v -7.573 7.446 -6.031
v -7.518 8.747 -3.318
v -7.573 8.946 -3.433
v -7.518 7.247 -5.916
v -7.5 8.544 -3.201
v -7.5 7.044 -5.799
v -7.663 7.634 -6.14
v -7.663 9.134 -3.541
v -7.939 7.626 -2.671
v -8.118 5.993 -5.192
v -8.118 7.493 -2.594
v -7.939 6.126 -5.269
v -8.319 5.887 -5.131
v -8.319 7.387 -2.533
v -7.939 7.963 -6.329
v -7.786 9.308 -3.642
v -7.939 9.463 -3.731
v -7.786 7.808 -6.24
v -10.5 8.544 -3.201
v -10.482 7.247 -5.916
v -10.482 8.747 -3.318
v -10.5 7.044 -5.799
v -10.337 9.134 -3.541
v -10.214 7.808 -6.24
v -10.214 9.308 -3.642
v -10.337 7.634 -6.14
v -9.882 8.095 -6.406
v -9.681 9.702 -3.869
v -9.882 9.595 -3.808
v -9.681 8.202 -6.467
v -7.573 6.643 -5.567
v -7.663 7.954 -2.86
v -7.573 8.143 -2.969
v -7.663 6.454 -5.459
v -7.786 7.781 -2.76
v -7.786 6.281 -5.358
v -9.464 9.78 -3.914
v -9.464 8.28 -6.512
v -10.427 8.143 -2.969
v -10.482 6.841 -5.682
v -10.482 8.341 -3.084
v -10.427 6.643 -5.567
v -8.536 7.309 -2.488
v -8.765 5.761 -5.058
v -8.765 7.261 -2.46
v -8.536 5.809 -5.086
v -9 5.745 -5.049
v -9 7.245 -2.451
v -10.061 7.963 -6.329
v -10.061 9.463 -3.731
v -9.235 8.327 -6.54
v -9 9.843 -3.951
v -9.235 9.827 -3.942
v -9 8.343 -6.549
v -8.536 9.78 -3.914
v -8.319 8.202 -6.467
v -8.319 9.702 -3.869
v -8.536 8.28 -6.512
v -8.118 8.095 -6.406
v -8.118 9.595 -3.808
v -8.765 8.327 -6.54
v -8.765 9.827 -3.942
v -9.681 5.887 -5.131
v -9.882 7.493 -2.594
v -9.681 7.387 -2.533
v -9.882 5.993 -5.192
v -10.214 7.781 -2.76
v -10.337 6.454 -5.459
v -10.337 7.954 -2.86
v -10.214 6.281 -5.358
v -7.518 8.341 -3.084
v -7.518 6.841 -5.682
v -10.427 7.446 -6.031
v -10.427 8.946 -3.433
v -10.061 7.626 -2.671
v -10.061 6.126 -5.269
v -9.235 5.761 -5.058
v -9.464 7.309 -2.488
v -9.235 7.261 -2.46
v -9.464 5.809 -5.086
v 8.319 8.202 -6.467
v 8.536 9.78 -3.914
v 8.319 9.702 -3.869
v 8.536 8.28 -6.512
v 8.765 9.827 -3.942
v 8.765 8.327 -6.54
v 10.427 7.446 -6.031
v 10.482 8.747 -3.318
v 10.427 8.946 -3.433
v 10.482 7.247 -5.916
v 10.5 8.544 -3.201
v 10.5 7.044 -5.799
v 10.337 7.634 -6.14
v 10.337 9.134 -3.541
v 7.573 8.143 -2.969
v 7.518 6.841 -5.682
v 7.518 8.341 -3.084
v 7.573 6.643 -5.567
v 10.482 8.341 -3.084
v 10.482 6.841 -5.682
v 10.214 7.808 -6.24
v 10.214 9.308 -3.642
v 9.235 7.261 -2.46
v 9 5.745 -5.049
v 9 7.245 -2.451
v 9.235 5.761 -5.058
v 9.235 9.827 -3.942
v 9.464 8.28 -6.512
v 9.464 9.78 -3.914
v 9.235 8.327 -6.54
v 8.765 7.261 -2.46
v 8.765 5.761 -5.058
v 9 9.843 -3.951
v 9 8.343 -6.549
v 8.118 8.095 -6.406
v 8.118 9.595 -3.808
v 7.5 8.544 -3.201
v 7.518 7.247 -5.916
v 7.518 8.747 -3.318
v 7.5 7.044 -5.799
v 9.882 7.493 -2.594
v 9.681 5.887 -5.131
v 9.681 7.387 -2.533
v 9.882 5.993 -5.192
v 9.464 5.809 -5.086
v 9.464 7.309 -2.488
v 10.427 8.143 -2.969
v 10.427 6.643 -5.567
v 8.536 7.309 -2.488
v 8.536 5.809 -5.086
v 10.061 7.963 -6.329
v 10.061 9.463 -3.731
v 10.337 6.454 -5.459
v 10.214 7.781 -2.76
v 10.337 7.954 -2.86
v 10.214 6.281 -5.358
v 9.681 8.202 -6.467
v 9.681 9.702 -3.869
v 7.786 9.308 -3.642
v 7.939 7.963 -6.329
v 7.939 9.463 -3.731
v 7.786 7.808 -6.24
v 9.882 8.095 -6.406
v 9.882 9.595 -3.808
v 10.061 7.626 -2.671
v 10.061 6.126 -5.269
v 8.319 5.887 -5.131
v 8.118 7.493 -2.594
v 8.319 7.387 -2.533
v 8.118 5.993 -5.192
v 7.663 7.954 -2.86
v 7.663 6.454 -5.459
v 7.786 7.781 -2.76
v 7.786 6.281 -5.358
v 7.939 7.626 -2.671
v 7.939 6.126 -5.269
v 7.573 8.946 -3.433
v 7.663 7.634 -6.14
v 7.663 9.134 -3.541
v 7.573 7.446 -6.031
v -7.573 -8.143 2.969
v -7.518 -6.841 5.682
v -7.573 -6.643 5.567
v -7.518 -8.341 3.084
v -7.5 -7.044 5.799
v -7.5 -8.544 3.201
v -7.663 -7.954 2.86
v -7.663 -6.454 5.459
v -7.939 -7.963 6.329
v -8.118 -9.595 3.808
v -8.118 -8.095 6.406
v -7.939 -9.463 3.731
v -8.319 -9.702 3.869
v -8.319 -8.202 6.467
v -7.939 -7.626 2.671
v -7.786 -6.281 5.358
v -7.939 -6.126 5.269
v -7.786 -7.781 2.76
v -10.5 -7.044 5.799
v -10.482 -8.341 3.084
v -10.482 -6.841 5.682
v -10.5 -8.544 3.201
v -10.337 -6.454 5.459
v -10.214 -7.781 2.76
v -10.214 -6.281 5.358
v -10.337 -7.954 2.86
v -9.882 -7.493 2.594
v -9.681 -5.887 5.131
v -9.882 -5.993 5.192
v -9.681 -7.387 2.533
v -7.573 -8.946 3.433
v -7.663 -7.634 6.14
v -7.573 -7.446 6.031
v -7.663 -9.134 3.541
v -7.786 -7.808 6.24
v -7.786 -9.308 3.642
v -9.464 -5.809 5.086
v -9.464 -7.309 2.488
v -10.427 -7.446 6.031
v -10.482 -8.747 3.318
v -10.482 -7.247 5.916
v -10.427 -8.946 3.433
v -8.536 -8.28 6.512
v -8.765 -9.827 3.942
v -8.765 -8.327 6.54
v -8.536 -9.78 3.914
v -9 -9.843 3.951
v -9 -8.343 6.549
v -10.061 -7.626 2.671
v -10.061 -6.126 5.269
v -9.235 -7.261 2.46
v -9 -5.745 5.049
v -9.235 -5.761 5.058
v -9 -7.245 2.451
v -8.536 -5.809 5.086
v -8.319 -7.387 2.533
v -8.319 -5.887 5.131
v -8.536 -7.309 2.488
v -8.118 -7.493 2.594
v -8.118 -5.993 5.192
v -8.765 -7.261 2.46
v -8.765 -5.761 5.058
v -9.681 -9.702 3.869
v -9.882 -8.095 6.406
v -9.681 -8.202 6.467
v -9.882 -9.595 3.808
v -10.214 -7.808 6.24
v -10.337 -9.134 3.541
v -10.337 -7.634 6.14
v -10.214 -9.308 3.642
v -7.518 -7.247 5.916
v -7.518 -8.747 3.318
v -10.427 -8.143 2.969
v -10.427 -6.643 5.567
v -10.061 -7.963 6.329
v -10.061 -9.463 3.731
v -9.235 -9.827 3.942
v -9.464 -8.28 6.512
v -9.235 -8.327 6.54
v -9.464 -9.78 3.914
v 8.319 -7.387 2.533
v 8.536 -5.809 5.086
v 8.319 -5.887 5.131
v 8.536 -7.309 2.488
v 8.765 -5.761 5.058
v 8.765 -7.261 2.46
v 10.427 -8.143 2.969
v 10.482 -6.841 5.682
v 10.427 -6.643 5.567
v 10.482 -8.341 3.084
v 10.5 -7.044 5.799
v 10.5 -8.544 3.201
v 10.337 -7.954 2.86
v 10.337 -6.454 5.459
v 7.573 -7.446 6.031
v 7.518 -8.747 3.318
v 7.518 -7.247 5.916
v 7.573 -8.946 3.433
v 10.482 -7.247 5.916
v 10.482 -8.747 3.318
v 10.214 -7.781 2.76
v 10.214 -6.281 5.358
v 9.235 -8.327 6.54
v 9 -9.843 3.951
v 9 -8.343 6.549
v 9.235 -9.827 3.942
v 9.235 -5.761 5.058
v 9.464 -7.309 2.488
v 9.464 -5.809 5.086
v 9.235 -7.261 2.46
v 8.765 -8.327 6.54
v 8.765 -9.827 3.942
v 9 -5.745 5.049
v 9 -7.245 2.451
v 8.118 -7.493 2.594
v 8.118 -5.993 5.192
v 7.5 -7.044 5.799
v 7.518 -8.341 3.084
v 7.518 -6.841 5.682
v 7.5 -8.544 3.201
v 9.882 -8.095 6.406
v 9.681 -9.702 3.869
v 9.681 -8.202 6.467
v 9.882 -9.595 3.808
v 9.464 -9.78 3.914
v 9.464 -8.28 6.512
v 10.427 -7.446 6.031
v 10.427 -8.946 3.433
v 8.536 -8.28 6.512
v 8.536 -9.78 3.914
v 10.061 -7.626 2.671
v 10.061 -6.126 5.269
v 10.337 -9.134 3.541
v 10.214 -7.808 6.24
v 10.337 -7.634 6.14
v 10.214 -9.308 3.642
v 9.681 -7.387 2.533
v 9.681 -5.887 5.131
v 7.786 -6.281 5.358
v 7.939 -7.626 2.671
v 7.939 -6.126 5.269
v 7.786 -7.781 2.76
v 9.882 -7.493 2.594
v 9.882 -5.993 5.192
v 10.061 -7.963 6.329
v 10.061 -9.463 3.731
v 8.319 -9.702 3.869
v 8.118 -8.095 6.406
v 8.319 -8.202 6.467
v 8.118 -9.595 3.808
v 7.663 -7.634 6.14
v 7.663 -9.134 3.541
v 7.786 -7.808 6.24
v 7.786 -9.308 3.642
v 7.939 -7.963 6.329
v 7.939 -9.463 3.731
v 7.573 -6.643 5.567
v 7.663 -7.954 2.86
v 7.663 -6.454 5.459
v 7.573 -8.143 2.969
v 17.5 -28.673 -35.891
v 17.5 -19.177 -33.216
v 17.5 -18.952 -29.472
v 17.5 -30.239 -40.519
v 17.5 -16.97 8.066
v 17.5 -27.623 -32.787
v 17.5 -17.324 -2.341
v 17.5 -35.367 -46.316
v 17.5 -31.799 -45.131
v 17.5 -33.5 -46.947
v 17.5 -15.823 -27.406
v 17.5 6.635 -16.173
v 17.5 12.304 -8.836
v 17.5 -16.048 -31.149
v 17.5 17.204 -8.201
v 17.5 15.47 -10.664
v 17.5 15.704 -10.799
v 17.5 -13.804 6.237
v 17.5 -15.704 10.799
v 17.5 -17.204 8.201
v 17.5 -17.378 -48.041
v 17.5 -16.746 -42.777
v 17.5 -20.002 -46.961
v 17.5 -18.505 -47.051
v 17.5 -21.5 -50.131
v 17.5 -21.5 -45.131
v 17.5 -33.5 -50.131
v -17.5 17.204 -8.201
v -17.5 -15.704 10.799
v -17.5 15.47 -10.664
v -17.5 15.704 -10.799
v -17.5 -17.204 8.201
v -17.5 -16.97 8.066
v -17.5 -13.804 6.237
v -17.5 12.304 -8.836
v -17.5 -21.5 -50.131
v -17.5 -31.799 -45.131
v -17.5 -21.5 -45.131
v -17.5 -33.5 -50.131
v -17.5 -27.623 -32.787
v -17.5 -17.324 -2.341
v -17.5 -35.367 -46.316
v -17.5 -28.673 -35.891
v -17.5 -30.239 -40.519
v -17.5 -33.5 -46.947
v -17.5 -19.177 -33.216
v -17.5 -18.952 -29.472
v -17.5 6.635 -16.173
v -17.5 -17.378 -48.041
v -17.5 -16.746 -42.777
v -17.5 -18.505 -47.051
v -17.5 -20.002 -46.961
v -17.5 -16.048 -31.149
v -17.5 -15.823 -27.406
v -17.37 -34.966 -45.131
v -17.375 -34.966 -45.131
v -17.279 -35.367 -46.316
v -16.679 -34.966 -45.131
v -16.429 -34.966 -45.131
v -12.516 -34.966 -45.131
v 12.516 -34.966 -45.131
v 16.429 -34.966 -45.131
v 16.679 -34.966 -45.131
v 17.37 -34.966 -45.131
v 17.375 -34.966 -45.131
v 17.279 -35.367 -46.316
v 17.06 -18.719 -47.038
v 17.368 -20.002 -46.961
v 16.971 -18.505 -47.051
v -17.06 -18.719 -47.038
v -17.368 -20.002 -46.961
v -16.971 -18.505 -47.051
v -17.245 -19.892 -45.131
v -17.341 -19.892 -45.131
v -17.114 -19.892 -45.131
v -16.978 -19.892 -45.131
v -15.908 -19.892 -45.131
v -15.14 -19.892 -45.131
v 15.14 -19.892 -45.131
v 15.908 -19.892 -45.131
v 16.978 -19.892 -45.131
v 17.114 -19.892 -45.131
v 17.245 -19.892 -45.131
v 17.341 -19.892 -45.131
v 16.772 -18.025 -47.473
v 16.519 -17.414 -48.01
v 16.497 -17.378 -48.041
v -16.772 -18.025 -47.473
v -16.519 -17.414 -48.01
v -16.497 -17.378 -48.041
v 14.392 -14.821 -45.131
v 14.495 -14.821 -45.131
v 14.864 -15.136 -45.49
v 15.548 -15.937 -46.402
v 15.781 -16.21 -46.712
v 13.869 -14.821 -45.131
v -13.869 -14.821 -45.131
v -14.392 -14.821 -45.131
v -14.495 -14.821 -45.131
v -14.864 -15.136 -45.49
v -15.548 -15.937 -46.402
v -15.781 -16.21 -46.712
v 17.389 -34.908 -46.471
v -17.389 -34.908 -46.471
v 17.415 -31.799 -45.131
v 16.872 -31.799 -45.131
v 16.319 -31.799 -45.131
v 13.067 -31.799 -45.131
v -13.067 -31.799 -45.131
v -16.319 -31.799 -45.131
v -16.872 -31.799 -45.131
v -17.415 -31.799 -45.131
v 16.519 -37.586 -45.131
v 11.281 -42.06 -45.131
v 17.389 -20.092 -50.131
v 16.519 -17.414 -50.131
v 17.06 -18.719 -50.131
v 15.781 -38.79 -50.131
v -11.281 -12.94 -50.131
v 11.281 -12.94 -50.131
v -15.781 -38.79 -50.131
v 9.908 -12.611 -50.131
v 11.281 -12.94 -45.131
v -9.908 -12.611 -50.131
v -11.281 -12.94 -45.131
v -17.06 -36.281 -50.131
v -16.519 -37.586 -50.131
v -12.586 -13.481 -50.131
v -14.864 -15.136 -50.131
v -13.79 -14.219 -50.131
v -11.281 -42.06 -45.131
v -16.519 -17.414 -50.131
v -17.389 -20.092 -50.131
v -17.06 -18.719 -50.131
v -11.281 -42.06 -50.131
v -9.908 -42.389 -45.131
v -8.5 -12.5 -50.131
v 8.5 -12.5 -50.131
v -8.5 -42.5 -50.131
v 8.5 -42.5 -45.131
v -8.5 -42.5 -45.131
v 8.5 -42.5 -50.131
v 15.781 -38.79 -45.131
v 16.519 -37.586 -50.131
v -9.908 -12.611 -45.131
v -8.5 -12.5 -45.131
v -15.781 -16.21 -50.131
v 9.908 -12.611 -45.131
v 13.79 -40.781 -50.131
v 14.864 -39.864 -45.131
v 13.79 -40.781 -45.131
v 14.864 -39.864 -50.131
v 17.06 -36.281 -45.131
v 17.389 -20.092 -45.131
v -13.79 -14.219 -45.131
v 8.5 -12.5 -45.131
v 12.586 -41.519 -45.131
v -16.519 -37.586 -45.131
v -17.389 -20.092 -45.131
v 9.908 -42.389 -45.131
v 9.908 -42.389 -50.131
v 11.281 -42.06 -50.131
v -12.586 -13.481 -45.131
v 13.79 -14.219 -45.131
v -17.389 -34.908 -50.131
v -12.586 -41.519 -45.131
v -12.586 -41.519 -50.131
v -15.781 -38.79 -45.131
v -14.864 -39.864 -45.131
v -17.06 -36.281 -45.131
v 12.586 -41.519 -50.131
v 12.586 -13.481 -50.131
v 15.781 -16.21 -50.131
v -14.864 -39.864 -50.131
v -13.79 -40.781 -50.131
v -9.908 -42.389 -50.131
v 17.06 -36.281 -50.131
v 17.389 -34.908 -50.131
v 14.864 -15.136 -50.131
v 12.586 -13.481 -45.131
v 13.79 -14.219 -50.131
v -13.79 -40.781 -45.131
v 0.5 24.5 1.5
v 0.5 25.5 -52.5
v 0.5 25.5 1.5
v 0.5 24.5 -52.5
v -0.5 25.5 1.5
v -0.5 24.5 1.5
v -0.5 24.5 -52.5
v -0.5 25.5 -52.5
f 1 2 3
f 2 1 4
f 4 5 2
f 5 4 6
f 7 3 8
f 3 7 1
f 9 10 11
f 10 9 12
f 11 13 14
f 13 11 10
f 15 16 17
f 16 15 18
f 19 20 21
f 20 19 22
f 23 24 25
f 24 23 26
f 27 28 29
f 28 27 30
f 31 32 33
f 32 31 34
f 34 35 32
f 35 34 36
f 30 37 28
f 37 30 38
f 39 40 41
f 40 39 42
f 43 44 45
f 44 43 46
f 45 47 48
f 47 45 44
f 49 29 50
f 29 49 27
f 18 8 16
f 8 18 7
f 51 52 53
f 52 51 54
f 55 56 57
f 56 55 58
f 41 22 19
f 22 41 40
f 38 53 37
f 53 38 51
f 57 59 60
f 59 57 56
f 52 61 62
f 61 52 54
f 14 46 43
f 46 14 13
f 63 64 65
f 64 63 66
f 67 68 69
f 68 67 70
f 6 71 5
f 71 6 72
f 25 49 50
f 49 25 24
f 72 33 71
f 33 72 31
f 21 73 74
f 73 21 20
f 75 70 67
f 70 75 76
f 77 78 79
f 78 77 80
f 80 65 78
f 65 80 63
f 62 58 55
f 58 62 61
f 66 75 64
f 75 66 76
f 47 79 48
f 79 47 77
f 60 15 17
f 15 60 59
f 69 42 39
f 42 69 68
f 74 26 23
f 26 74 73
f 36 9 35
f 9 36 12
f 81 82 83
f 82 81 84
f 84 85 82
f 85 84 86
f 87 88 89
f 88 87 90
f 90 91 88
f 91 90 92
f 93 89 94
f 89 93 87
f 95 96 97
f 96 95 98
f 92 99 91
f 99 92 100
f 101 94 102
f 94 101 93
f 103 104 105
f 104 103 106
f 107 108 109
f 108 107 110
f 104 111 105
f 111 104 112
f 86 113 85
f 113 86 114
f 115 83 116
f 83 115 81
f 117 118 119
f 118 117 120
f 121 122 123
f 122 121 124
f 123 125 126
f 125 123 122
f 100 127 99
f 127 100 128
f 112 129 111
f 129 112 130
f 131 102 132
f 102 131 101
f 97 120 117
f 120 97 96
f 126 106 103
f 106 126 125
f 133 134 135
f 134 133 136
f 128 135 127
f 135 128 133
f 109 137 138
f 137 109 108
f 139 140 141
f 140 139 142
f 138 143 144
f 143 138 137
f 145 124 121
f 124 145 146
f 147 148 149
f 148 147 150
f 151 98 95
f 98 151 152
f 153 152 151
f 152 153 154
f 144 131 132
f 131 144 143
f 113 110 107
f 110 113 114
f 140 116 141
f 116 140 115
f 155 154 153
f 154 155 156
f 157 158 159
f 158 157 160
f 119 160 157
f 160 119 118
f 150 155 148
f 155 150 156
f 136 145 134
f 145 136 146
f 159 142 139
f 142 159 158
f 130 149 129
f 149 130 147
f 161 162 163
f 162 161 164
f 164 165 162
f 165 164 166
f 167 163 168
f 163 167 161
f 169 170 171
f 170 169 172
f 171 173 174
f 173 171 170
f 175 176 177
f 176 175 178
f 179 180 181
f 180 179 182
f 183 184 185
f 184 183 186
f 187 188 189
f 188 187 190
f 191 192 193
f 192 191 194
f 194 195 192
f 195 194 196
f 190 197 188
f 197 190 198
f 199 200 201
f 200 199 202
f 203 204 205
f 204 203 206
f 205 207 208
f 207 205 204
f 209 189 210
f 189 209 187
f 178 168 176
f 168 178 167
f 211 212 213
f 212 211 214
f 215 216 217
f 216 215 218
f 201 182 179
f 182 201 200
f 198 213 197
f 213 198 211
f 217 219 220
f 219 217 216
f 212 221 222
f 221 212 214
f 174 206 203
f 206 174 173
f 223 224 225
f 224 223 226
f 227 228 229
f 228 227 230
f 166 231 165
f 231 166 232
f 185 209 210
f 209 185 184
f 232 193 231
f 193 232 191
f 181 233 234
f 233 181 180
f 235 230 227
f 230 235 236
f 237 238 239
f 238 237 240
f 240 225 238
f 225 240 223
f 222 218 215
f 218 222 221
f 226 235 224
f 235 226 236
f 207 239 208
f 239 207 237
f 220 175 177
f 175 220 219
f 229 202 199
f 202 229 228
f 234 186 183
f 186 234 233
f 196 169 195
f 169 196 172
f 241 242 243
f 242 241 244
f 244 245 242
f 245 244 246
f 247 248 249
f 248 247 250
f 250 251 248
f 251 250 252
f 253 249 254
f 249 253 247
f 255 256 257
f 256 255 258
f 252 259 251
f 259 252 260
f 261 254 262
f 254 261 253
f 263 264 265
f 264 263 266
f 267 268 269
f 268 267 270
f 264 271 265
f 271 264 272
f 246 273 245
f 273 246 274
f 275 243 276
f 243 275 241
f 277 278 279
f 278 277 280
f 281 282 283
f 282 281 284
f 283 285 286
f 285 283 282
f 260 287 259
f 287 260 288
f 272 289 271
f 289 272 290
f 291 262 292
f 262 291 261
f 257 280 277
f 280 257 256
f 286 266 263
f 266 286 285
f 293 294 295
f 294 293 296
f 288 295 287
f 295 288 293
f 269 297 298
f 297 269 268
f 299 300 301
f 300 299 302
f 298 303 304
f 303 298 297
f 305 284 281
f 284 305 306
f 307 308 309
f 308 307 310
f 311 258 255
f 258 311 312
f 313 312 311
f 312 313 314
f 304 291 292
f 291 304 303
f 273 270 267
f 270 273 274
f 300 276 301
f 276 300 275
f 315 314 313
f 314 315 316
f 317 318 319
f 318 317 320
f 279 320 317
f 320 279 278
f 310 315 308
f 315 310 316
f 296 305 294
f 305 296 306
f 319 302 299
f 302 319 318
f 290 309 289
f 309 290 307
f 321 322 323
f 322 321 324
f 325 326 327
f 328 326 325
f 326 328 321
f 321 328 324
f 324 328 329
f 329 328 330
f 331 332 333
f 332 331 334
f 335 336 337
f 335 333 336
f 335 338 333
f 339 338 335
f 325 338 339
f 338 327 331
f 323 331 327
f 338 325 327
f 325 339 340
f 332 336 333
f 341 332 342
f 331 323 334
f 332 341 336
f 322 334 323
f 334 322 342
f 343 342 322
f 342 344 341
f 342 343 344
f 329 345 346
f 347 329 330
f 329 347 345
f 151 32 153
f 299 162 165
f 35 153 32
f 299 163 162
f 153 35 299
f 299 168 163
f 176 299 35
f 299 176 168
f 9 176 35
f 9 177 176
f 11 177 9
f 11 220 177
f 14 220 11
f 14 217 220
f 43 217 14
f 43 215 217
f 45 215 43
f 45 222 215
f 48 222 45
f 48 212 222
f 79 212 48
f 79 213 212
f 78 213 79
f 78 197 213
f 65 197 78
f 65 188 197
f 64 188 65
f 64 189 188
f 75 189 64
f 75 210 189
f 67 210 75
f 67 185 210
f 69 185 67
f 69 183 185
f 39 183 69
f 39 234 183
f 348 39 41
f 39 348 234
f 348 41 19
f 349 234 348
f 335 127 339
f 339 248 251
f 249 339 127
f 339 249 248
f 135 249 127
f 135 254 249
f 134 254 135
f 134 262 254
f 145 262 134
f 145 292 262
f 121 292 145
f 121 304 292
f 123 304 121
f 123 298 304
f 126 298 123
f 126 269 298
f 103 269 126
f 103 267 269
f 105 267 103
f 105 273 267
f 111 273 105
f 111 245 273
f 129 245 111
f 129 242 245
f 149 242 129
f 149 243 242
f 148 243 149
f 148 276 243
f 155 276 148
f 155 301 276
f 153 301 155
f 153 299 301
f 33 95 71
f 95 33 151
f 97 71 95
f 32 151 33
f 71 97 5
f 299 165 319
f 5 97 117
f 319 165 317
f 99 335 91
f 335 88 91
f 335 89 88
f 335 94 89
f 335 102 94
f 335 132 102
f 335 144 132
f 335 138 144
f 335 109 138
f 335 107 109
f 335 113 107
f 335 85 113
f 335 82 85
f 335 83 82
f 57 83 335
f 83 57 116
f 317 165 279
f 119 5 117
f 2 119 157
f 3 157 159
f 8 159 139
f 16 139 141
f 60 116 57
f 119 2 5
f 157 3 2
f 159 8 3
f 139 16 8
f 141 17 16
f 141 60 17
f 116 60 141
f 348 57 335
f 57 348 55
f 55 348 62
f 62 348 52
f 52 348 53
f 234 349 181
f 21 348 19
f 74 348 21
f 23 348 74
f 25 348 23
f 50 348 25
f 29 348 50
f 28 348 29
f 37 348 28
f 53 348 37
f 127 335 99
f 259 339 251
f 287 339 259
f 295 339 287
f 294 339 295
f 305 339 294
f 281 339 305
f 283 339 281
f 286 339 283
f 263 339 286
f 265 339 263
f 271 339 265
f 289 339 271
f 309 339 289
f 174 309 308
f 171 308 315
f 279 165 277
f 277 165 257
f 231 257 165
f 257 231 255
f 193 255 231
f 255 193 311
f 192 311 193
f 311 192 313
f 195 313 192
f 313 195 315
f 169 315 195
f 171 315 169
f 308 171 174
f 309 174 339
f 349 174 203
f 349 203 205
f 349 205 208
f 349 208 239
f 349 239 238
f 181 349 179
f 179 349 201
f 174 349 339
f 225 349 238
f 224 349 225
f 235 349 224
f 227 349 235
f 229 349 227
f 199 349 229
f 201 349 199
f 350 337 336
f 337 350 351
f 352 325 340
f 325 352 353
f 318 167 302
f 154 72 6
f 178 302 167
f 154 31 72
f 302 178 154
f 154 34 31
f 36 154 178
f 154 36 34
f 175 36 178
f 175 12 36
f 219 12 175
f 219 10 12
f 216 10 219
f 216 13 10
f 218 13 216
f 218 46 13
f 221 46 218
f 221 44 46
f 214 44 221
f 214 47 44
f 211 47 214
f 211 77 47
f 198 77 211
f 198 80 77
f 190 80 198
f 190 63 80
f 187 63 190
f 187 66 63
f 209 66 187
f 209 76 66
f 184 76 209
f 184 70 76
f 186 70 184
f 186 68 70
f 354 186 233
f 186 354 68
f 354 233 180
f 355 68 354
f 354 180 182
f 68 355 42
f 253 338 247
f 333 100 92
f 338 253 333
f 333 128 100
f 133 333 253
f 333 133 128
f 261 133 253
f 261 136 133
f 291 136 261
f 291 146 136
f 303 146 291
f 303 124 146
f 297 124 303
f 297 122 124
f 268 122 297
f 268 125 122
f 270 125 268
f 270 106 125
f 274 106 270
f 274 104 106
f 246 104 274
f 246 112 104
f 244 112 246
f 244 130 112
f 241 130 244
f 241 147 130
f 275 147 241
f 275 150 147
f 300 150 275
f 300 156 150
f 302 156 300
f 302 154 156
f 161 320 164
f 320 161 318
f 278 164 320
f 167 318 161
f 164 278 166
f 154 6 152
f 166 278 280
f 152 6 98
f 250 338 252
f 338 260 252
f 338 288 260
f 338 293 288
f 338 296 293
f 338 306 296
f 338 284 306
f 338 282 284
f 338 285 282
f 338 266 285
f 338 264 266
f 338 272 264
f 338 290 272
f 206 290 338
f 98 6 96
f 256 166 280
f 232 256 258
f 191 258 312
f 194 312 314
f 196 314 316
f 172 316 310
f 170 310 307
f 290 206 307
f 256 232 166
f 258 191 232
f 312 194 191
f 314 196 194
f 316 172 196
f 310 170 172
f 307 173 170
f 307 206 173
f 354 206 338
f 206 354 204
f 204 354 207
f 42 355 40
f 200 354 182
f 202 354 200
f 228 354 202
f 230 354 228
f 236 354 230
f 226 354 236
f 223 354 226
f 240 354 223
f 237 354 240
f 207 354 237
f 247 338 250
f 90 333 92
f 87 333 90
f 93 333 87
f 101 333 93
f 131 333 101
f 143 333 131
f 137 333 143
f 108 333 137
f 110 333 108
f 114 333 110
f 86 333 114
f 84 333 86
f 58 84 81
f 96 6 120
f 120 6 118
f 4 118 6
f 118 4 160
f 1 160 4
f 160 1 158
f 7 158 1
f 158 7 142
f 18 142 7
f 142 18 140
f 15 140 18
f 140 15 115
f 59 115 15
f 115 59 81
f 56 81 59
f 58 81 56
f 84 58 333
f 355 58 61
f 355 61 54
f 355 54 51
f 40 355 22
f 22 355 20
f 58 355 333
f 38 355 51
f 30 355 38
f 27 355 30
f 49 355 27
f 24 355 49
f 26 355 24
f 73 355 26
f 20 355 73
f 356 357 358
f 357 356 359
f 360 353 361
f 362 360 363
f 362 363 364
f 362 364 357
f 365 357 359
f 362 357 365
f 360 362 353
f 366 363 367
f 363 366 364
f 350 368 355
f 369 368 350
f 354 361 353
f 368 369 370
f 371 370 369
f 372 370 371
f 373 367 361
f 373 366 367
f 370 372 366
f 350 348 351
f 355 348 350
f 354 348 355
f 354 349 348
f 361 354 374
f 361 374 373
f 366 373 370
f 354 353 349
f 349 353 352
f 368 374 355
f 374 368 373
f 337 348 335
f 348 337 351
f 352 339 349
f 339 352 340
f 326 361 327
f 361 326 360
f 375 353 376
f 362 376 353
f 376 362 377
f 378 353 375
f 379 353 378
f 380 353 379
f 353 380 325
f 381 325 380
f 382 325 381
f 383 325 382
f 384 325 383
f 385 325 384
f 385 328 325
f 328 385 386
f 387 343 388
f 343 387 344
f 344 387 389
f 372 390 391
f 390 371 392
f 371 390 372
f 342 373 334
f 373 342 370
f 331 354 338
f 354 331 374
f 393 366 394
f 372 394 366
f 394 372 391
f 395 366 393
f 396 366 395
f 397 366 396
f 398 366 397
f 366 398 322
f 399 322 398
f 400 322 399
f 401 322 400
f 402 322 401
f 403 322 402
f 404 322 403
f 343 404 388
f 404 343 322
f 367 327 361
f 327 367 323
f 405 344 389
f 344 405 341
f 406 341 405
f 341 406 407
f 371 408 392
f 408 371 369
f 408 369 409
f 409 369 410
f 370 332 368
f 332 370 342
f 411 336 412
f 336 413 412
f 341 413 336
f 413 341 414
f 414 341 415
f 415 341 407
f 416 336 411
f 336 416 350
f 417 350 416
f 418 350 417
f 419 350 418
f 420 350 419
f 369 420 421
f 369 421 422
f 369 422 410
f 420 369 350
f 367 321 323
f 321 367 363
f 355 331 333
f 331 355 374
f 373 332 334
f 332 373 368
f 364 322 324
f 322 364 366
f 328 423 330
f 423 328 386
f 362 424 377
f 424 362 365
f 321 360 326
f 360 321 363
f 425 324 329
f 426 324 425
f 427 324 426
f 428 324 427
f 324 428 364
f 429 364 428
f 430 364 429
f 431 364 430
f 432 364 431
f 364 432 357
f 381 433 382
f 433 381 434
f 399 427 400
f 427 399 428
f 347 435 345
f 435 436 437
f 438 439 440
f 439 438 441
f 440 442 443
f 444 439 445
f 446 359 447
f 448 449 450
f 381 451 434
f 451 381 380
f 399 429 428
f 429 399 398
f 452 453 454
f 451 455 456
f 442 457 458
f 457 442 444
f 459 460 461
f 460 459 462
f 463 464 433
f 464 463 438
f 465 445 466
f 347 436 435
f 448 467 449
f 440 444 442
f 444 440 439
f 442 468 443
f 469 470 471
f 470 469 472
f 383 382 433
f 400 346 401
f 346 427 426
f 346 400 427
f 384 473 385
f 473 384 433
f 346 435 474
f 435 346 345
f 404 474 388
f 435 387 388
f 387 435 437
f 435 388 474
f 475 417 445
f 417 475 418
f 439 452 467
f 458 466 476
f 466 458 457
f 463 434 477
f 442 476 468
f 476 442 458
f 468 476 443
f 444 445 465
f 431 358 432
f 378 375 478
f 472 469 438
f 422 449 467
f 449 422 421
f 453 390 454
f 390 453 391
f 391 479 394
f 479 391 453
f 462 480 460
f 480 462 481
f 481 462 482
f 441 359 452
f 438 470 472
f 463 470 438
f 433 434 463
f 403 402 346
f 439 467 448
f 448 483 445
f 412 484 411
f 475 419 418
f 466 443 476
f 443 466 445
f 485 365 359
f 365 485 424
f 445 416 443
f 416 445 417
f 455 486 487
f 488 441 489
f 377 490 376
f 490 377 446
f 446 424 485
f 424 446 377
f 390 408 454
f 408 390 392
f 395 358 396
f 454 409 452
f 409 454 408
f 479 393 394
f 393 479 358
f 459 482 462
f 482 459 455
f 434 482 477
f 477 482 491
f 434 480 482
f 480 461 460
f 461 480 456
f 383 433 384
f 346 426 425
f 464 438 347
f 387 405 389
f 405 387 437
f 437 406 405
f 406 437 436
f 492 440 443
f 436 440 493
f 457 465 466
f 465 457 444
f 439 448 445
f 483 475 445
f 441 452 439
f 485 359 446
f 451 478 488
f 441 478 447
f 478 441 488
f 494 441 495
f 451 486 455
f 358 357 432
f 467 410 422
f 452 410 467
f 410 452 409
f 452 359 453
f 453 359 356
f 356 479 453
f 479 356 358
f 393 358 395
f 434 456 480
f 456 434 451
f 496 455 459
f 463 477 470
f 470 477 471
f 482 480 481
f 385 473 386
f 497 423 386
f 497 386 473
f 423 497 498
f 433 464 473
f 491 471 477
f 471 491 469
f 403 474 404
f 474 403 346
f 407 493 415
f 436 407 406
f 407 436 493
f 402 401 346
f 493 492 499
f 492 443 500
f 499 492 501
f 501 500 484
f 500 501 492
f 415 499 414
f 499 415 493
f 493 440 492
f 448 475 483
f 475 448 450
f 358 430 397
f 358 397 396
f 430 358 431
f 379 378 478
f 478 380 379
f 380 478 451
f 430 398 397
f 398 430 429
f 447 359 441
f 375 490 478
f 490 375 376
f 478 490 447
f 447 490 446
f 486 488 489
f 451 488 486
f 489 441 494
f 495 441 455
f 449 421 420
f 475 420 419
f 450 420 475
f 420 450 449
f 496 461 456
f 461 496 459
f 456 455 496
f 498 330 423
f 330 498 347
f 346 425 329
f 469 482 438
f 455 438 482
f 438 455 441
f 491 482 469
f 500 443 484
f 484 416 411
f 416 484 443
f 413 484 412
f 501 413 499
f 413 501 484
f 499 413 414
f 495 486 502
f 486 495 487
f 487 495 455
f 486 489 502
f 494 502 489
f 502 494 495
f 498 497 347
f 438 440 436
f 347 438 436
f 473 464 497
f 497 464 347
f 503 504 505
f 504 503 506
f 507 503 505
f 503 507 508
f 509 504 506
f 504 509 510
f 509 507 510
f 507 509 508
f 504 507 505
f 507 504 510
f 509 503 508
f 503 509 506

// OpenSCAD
//draft of new arm+feet modules for piggy 
$fn=40;

inch=25.4;

bolts_radius=3/2;//M3
propeller_radius=9*inch/2;

thick=3;
body_thick=4;
body_bottom_thick=5;
body_width=60;
body_height=33;

angle_front=30;//angle between front arm and Left-Right axis
angle_tail=30;//angle between back arm and horizontal

//// Motor mounts
motor_radius=28/2;
jeu=2;
motor_mount_radius=motor_radius+jeu/2;
motor_mount_height=16; // dimension D
motor_3wires_diam=12;
motor_screw_radius=3/2; // M3 From http://www.hobbyking.com/hobbyking/store/__36408__Turnigy_Aerodrive_SK3_2830_1020kv_Brushless_Outrunner_Motor_EU_warehouse_.html
motor_screw_separation_small = 16; // Much more complicated than expected
motor_screw_separation_large = 19; // Much more complicated than expected
motor_hold_width=10;
motor_mount_outradius=motor_mount_radius+thick;

//// Electronics fixing
electronic_size=50;//DroFly: 50mmx50mm
electronic_entraxe=45;
electronic_space=1.4*electronic_size; //space for electronics

body_front_l=1.1*electronic_space/2; //front arms fix positioning
body_back_l=1.1*electronic_space/2; //back arms fix positioning
body_tot_l=body_front_l+body_back_l;

//// Arms and arms fixing.
frontarm_length=propeller_radius*1.6;
backarm_length=propeller_radius*1.3;
nw_front=3;// number of wallies for front arm
nw_back=2;

front_arm_fix_width=52;// width used to fix the front arms
back_arm_fix_width=front_arm_fix_width;

body_back_arm_fix_height=body_height*cos(angle_tail);

arm_fix_height=body_height;
arm_fix_entraxe=30;
back_entraxe=arm_fix_entraxe;
front_entraxe=arm_fix_entraxe;
body_2_backarm_l=back_entraxe*3/2;

// Front foot variables
foot_support_height = 30;
foot_height = 5;

front_foot_thickness = 15;
front_foot_support_width = 2*(motor_mount_radius + thick);
front_foot_width = 0.75*front_foot_support_width;
front_foot_D = 10;	// Distance between the supports

// Back foot variables
back_foot_thickness = 15;
back_foot_support_width = body_width/2;
back_foot_width = 1.2*back_foot_support_width;
back_foot_D_1 = 16;	// Distance between the supports
back_foot_D_2 = 7.1;	// Distance between the supports
back_foot_pos_1 = -2;	// Distance between the supports
back_foot_pos_2 = 18;	// Distance between the supports
back_foot_dx = -11;

// Leave space for ESCs in different arms
escspace_l=75;  //length
escspace_w=28;  //width
escspace_h=11;  //height
escspace_d_from_motor=40;//60; //distance between motor axis and motor-side of ESC
escspace_d_from_motor2=92; //one ESC has a different layout, with 3 wires on motor-side
//TODO: ESC space z-position is obtained experimentally here, arm_fix_height/2.3

//hole for usb cable
usb_h=12;
usb_w=12;
usb_offset=-11.3;
elec_h=-5;

//// Misc

serre_hole1=3;// serre-cable holes dimensions
serre_hole2=6;


motor_mount_height=15;
motor_hole_diam=2*3.75;

//#### Part: arm
//#Sub modules: motor_mount, sidewall,renfort




arm_length=150;
arm_fix_width=50;
arm_angle=atan((arm_fix_width-2*motor_mount_outradius)/(2*arm_length));
renfort_width=5;
n_renforts=2;



module motor_mount(){
/*	%translate([0,0,45+0*motor_mount_height*2])cylinder(h=10,r=propeller_radius);*/

	difference(){
		rotate_extrude(convexity=10)
		translate([motor_mount_outradius,0,0])
		projection()
		rotate([0,90,90])
			softangle(1,thick,2*thick,thick,motor_mount_height,thick);
		translate([motor_radius/2,-motor_3wires_diam/2,thick])
			cube([motor_radius,motor_3wires_diam,motor_mount_height]);
	}

	translate([0,0,thick/2])
		3holeplank(2*motor_mount_radius,motor_3wires_diam,thick,motor_hole_diam,2*motor_screw_radius,motor_screw_separation_large);

	rotate([0,0,90])translate([0,0,thick/2])
		3holeplank(2*motor_mount_radius,motor_3wires_diam,thick,motor_hole_diam,2*motor_screw_radius,motor_screw_separation_small);

}


module sidewall(){
	softangle(arm_length,thick,2*thick,thick,motor_mount_height,2*thick);
	translate([arm_length,0,0])
	rotate([0,0,90])
		softangle(thick,motor_mount_height,arm_length,motor_mount_height,arm_fix_height,arm_fix_height-motor_mount_height);
}


module renfort(side1,side2){
	rotate([0,0,90])
	difference(){
			trapeze(side2,side1,renfort_width,motor_mount_height);
		translate([0,0,motor_mount_height+2*thick])
		rotate([90,0,0])
			cylinder(r=motor_mount_height,h=1.2*renfort_width,center=true);
	}
}


module arm(){

	difference(){
		union(){
			//side walls
			translate([0,-motor_mount_outradius,0])
			rotate([0,0,-arm_angle]) 
				sidewall();
			mirror([0,1,0])
			translate([0,-motor_mount_outradius,0])
			rotate([0,0,-arm_angle])
				sidewall();
			//floor
			translate([arm_length/2,0,0])
			rotate([0,0,-90])
				trapeze(2*motor_mount_outradius,arm_fix_width,arm_length,thick);
		}
		cylinder(h=2*motor_mount_height,r=motor_mount_outradius,center=true);
	}


	//motor mount
	motor_mount();


	//renforts
	incr=arm_length/(n_renforts+1);
	for ( i=[1:n_renforts] ){
		assign(
					side1=2*motor_mount_outradius+2*(i*incr-renfort_width/2)*sin(arm_angle),
					side2=2*motor_mount_outradius+2*(i*incr+renfort_width/2)*sin(arm_angle)
				)
		translate([i*incr,0,0])
			renfort(side1,side2);
	}


	//fixation vers body
	translate([arm_length,0,arm_fix_height/2])
	rotate([90,0,90])
	3holeplank(arm_fix_width,arm_fix_height,2*thick, 1.5*motor_3wires_diam,2*bolts_radius,arm_fix_entraxe );


}




leg_fix_entraxe=motor_mount_outradius;


/*incr=arm_length/(n_renforts+1);*/
/*difference(){*/
/*	arm();*/
/*	for ( i=[1:n_renforts] ){*/
/*		translate([(i+0.25)*incr,0,0])*/
/*		rotate([0,0,90])*/
/*			union(){*/
/*				2holes(2*bolts_radius,leg_fix_entraxe);*/
/*				translate([0,-leg_fix_entraxe,0])*/
/*				2holes(2*bolts_radius,leg_fix_entraxe);*/
/*			}*/
/*		}*/

/*}*/





//##############
//#### Part: legs
//#Sub modules: 

leg_height=50;
leg_fix_width=35;
ankle_width=15;
foot_width=30;
foot_height=5;


height_above_ground=foot_height/2+thick/2+leg_height;

module xleg(){
	//body fix
	difference(){
		cube([leg_fix_width,leg_fix_width,thick],center=true);
		translate([0,leg_fix_entraxe/2,0])
			2holes(2*bolts_radius,leg_fix_entraxe);
		translate([0,-leg_fix_entraxe/2,0])
			2holes(2*bolts_radius,leg_fix_entraxe);
	}


	module half_leg(){
		translate([0,-leg_fix_width/2+thick,0])
		rotate([leg_angle,0,0])
		translate([0,0,-leg_height/(2*cos(leg_angle))])
		cube([leg_fix_width,thick,leg_height/cos(leg_angle)],center=true);

		translate([0,-leg_fix_width/2+thick,0])
		rotate([3*leg_angle,0,0])
		translate([0,0,-leg_height/(2*cos(3*leg_angle))])
		cube([leg_fix_width,thick,leg_height/cos(3*leg_angle)],center=true);
	}

	//leg
	half_leg();
	mirror([0,1,0])
	half_leg();


	//foot
	translate([0,0,-leg_height])
	minkowski(){
		cylinder(r=3*thick,h=foot_height/2,center=true);
		cube([leg_fix_width-3*thick,foot_width-3*thick,foot_height/2],center=true);
	}

}




module leg(){
	//body fix
	difference(){
		cube([leg_fix_width,leg_fix_width+thick,thick],center=true);
		translate([0,leg_fix_entraxe/2,0])
			2holes(2*bolts_radius,leg_fix_entraxe);
		translate([0,-leg_fix_entraxe/2,0])
			2holes(2*bolts_radius,leg_fix_entraxe);
	}


	module half_leg(){

		alpha=atan((leg_fix_width-ankle_width)/(2*leg_height));
		beta=atan((leg_fix_width+ankle_width)/(2*leg_height));

		translate([0,-leg_fix_width/2,0])
		rotate([alpha,0,0])
		translate([0,0,-leg_height/(2*cos(alpha))])
		cube([leg_fix_width,thick,leg_height/cos(alpha)],center=true);

		translate([0,-leg_fix_width/2,0])
		rotate([beta,0,0])
		translate([0,0,-leg_height/(2*cos(beta))])
		cube([leg_fix_width,thick,leg_height/cos(beta)],center=true);
	}

	//leg
	half_leg();
	mirror([0,1,0])
	half_leg();


	//foot
	translate([0,0,-leg_height])
	minkowski(){
		cylinder(r=3*thick,h=foot_height/2,center=true);
		cube([leg_fix_width-6*thick,foot_width-6*thick,foot_height/2],center=true);
	}

}




module back_leg(){
	//body fix
	difference(){
		cube([leg_fix_width,leg_fix_width+thick,thick],center=true);
		translate([0,leg_fix_entraxe/2,0])
			2holes(2*bolts_radius,leg_fix_entraxe);
		translate([0,-leg_fix_entraxe/2,0])
			2holes(2*bolts_radius,leg_fix_entraxe);
	}


	alpha=atan((leg_fix_width-ankle_width)/(2*leg_height));
	beta=atan((leg_fix_width+ankle_width)/(2*leg_height));

	module half_leg(){
		translate([0,-leg_fix_width/2,0])
		rotate([alpha,0,0])
		translate([0,0,-leg_height/(2*cos(alpha))])
		cube([leg_fix_width,thick,leg_height/cos(alpha)],center=true);

		translate([0,-leg_fix_width/2,0])
		rotate([beta,0,0])
		translate([0,0,-leg_height/(2*cos(beta))])
		cube([leg_fix_width,thick,leg_height/cos(beta)],center=true);
	}

	//leg
	half_leg();
	mirror([0,1,0])
	half_leg();

	translate([0,-leg_fix_width/2,0])
	rotate([alpha,0,0])
	translate([0,0,-leg_height/cos(alpha)])
	cube([leg_fix_width,thick,0.3*leg_height/cos(alpha)],center=true);




	//foot
	translate([0,0,-1.1*leg_height])
	rotate([angle_tail,0,0])
	minkowski(){
		cylinder(r=3*thick,h=foot_height/2,center=true);
		cube([leg_fix_width-6*thick,foot_width-6*thick,foot_height/2],center=true);
	}

}












translate([0,25,(thick-height_above_ground)/2])
cube([1,1,height_above_ground],center=true);

rotate([-angle_tail,0,0])
back_leg();



//#################
//#### Handy tools


module torus(outer_radius,cross_section_radius){
	rotate_extrude(convexity = 10)
	translate([outer_radius-cross_section_radius, 0, 0])
	circle(r = cross_section_radius); 
}



module 1holeplank(length,width,thickness,hole_diam){
	difference(){
		cube([length,width,thickness],center=true);
			cylinder(h=3*thickness,r=hole_diam/2,center=true);
	}
}


module 2holes(diam,sep,h=100){
	translate([-sep/2,0,0])
		cylinder(h=h,r=diam/2,center=true);
	translate([sep/2,0,0])
		cylinder(h=h,r=diam/2,center=true);
}


module 3holeplank(length,width,thickness,center_hole_diam,side_hole_diam,side_hole_sep){
	difference(){
		1holeplank(length,width,thickness,center_hole_diam);
		2holes(side_hole_diam,side_hole_sep);
	}
}



module demitrapeze(base,top,height,thick){
	linear_extrude(height=thick)
		polygon(points=[[0,0],[base,0],[top,height],[0,height]],paths=[ [0,1,2,3] ]);
}


module softangle(length, depth1, depth2, height1, height2,radius){
	cube([length,depth2,height1]);
	cube([length,depth1,height2]);
	difference(){
		cube([length,depth1+radius,height1+radius]);
		translate([-0.05*length,depth1+radius,height1+radius])rotate([0,90,0])
			cylinder(h=1.1*length,r=radius);
	}
}


module trapeze(base,top,height,thick){
     linear_extrude(height=thick)
     polygon(points=[[base/2,-height/2],[-base/2,-height/2],[-top/2,height/2],[top/2,height/2]],paths=[ [0,1,2,3] ]);
}

aaa=3.17;
module m3nut(){
	union(){
		cube([5.5,aaa,body_bottom_thick/2],center=true);
		rotate([0,0,60])cube([5.5,aaa,body_bottom_thick/2],center=true);
		rotate([0,0,-60])cube([5.5,aaa,body_bottom_thick/2],center=true);
    }
}
//scale(100)m3nut();
